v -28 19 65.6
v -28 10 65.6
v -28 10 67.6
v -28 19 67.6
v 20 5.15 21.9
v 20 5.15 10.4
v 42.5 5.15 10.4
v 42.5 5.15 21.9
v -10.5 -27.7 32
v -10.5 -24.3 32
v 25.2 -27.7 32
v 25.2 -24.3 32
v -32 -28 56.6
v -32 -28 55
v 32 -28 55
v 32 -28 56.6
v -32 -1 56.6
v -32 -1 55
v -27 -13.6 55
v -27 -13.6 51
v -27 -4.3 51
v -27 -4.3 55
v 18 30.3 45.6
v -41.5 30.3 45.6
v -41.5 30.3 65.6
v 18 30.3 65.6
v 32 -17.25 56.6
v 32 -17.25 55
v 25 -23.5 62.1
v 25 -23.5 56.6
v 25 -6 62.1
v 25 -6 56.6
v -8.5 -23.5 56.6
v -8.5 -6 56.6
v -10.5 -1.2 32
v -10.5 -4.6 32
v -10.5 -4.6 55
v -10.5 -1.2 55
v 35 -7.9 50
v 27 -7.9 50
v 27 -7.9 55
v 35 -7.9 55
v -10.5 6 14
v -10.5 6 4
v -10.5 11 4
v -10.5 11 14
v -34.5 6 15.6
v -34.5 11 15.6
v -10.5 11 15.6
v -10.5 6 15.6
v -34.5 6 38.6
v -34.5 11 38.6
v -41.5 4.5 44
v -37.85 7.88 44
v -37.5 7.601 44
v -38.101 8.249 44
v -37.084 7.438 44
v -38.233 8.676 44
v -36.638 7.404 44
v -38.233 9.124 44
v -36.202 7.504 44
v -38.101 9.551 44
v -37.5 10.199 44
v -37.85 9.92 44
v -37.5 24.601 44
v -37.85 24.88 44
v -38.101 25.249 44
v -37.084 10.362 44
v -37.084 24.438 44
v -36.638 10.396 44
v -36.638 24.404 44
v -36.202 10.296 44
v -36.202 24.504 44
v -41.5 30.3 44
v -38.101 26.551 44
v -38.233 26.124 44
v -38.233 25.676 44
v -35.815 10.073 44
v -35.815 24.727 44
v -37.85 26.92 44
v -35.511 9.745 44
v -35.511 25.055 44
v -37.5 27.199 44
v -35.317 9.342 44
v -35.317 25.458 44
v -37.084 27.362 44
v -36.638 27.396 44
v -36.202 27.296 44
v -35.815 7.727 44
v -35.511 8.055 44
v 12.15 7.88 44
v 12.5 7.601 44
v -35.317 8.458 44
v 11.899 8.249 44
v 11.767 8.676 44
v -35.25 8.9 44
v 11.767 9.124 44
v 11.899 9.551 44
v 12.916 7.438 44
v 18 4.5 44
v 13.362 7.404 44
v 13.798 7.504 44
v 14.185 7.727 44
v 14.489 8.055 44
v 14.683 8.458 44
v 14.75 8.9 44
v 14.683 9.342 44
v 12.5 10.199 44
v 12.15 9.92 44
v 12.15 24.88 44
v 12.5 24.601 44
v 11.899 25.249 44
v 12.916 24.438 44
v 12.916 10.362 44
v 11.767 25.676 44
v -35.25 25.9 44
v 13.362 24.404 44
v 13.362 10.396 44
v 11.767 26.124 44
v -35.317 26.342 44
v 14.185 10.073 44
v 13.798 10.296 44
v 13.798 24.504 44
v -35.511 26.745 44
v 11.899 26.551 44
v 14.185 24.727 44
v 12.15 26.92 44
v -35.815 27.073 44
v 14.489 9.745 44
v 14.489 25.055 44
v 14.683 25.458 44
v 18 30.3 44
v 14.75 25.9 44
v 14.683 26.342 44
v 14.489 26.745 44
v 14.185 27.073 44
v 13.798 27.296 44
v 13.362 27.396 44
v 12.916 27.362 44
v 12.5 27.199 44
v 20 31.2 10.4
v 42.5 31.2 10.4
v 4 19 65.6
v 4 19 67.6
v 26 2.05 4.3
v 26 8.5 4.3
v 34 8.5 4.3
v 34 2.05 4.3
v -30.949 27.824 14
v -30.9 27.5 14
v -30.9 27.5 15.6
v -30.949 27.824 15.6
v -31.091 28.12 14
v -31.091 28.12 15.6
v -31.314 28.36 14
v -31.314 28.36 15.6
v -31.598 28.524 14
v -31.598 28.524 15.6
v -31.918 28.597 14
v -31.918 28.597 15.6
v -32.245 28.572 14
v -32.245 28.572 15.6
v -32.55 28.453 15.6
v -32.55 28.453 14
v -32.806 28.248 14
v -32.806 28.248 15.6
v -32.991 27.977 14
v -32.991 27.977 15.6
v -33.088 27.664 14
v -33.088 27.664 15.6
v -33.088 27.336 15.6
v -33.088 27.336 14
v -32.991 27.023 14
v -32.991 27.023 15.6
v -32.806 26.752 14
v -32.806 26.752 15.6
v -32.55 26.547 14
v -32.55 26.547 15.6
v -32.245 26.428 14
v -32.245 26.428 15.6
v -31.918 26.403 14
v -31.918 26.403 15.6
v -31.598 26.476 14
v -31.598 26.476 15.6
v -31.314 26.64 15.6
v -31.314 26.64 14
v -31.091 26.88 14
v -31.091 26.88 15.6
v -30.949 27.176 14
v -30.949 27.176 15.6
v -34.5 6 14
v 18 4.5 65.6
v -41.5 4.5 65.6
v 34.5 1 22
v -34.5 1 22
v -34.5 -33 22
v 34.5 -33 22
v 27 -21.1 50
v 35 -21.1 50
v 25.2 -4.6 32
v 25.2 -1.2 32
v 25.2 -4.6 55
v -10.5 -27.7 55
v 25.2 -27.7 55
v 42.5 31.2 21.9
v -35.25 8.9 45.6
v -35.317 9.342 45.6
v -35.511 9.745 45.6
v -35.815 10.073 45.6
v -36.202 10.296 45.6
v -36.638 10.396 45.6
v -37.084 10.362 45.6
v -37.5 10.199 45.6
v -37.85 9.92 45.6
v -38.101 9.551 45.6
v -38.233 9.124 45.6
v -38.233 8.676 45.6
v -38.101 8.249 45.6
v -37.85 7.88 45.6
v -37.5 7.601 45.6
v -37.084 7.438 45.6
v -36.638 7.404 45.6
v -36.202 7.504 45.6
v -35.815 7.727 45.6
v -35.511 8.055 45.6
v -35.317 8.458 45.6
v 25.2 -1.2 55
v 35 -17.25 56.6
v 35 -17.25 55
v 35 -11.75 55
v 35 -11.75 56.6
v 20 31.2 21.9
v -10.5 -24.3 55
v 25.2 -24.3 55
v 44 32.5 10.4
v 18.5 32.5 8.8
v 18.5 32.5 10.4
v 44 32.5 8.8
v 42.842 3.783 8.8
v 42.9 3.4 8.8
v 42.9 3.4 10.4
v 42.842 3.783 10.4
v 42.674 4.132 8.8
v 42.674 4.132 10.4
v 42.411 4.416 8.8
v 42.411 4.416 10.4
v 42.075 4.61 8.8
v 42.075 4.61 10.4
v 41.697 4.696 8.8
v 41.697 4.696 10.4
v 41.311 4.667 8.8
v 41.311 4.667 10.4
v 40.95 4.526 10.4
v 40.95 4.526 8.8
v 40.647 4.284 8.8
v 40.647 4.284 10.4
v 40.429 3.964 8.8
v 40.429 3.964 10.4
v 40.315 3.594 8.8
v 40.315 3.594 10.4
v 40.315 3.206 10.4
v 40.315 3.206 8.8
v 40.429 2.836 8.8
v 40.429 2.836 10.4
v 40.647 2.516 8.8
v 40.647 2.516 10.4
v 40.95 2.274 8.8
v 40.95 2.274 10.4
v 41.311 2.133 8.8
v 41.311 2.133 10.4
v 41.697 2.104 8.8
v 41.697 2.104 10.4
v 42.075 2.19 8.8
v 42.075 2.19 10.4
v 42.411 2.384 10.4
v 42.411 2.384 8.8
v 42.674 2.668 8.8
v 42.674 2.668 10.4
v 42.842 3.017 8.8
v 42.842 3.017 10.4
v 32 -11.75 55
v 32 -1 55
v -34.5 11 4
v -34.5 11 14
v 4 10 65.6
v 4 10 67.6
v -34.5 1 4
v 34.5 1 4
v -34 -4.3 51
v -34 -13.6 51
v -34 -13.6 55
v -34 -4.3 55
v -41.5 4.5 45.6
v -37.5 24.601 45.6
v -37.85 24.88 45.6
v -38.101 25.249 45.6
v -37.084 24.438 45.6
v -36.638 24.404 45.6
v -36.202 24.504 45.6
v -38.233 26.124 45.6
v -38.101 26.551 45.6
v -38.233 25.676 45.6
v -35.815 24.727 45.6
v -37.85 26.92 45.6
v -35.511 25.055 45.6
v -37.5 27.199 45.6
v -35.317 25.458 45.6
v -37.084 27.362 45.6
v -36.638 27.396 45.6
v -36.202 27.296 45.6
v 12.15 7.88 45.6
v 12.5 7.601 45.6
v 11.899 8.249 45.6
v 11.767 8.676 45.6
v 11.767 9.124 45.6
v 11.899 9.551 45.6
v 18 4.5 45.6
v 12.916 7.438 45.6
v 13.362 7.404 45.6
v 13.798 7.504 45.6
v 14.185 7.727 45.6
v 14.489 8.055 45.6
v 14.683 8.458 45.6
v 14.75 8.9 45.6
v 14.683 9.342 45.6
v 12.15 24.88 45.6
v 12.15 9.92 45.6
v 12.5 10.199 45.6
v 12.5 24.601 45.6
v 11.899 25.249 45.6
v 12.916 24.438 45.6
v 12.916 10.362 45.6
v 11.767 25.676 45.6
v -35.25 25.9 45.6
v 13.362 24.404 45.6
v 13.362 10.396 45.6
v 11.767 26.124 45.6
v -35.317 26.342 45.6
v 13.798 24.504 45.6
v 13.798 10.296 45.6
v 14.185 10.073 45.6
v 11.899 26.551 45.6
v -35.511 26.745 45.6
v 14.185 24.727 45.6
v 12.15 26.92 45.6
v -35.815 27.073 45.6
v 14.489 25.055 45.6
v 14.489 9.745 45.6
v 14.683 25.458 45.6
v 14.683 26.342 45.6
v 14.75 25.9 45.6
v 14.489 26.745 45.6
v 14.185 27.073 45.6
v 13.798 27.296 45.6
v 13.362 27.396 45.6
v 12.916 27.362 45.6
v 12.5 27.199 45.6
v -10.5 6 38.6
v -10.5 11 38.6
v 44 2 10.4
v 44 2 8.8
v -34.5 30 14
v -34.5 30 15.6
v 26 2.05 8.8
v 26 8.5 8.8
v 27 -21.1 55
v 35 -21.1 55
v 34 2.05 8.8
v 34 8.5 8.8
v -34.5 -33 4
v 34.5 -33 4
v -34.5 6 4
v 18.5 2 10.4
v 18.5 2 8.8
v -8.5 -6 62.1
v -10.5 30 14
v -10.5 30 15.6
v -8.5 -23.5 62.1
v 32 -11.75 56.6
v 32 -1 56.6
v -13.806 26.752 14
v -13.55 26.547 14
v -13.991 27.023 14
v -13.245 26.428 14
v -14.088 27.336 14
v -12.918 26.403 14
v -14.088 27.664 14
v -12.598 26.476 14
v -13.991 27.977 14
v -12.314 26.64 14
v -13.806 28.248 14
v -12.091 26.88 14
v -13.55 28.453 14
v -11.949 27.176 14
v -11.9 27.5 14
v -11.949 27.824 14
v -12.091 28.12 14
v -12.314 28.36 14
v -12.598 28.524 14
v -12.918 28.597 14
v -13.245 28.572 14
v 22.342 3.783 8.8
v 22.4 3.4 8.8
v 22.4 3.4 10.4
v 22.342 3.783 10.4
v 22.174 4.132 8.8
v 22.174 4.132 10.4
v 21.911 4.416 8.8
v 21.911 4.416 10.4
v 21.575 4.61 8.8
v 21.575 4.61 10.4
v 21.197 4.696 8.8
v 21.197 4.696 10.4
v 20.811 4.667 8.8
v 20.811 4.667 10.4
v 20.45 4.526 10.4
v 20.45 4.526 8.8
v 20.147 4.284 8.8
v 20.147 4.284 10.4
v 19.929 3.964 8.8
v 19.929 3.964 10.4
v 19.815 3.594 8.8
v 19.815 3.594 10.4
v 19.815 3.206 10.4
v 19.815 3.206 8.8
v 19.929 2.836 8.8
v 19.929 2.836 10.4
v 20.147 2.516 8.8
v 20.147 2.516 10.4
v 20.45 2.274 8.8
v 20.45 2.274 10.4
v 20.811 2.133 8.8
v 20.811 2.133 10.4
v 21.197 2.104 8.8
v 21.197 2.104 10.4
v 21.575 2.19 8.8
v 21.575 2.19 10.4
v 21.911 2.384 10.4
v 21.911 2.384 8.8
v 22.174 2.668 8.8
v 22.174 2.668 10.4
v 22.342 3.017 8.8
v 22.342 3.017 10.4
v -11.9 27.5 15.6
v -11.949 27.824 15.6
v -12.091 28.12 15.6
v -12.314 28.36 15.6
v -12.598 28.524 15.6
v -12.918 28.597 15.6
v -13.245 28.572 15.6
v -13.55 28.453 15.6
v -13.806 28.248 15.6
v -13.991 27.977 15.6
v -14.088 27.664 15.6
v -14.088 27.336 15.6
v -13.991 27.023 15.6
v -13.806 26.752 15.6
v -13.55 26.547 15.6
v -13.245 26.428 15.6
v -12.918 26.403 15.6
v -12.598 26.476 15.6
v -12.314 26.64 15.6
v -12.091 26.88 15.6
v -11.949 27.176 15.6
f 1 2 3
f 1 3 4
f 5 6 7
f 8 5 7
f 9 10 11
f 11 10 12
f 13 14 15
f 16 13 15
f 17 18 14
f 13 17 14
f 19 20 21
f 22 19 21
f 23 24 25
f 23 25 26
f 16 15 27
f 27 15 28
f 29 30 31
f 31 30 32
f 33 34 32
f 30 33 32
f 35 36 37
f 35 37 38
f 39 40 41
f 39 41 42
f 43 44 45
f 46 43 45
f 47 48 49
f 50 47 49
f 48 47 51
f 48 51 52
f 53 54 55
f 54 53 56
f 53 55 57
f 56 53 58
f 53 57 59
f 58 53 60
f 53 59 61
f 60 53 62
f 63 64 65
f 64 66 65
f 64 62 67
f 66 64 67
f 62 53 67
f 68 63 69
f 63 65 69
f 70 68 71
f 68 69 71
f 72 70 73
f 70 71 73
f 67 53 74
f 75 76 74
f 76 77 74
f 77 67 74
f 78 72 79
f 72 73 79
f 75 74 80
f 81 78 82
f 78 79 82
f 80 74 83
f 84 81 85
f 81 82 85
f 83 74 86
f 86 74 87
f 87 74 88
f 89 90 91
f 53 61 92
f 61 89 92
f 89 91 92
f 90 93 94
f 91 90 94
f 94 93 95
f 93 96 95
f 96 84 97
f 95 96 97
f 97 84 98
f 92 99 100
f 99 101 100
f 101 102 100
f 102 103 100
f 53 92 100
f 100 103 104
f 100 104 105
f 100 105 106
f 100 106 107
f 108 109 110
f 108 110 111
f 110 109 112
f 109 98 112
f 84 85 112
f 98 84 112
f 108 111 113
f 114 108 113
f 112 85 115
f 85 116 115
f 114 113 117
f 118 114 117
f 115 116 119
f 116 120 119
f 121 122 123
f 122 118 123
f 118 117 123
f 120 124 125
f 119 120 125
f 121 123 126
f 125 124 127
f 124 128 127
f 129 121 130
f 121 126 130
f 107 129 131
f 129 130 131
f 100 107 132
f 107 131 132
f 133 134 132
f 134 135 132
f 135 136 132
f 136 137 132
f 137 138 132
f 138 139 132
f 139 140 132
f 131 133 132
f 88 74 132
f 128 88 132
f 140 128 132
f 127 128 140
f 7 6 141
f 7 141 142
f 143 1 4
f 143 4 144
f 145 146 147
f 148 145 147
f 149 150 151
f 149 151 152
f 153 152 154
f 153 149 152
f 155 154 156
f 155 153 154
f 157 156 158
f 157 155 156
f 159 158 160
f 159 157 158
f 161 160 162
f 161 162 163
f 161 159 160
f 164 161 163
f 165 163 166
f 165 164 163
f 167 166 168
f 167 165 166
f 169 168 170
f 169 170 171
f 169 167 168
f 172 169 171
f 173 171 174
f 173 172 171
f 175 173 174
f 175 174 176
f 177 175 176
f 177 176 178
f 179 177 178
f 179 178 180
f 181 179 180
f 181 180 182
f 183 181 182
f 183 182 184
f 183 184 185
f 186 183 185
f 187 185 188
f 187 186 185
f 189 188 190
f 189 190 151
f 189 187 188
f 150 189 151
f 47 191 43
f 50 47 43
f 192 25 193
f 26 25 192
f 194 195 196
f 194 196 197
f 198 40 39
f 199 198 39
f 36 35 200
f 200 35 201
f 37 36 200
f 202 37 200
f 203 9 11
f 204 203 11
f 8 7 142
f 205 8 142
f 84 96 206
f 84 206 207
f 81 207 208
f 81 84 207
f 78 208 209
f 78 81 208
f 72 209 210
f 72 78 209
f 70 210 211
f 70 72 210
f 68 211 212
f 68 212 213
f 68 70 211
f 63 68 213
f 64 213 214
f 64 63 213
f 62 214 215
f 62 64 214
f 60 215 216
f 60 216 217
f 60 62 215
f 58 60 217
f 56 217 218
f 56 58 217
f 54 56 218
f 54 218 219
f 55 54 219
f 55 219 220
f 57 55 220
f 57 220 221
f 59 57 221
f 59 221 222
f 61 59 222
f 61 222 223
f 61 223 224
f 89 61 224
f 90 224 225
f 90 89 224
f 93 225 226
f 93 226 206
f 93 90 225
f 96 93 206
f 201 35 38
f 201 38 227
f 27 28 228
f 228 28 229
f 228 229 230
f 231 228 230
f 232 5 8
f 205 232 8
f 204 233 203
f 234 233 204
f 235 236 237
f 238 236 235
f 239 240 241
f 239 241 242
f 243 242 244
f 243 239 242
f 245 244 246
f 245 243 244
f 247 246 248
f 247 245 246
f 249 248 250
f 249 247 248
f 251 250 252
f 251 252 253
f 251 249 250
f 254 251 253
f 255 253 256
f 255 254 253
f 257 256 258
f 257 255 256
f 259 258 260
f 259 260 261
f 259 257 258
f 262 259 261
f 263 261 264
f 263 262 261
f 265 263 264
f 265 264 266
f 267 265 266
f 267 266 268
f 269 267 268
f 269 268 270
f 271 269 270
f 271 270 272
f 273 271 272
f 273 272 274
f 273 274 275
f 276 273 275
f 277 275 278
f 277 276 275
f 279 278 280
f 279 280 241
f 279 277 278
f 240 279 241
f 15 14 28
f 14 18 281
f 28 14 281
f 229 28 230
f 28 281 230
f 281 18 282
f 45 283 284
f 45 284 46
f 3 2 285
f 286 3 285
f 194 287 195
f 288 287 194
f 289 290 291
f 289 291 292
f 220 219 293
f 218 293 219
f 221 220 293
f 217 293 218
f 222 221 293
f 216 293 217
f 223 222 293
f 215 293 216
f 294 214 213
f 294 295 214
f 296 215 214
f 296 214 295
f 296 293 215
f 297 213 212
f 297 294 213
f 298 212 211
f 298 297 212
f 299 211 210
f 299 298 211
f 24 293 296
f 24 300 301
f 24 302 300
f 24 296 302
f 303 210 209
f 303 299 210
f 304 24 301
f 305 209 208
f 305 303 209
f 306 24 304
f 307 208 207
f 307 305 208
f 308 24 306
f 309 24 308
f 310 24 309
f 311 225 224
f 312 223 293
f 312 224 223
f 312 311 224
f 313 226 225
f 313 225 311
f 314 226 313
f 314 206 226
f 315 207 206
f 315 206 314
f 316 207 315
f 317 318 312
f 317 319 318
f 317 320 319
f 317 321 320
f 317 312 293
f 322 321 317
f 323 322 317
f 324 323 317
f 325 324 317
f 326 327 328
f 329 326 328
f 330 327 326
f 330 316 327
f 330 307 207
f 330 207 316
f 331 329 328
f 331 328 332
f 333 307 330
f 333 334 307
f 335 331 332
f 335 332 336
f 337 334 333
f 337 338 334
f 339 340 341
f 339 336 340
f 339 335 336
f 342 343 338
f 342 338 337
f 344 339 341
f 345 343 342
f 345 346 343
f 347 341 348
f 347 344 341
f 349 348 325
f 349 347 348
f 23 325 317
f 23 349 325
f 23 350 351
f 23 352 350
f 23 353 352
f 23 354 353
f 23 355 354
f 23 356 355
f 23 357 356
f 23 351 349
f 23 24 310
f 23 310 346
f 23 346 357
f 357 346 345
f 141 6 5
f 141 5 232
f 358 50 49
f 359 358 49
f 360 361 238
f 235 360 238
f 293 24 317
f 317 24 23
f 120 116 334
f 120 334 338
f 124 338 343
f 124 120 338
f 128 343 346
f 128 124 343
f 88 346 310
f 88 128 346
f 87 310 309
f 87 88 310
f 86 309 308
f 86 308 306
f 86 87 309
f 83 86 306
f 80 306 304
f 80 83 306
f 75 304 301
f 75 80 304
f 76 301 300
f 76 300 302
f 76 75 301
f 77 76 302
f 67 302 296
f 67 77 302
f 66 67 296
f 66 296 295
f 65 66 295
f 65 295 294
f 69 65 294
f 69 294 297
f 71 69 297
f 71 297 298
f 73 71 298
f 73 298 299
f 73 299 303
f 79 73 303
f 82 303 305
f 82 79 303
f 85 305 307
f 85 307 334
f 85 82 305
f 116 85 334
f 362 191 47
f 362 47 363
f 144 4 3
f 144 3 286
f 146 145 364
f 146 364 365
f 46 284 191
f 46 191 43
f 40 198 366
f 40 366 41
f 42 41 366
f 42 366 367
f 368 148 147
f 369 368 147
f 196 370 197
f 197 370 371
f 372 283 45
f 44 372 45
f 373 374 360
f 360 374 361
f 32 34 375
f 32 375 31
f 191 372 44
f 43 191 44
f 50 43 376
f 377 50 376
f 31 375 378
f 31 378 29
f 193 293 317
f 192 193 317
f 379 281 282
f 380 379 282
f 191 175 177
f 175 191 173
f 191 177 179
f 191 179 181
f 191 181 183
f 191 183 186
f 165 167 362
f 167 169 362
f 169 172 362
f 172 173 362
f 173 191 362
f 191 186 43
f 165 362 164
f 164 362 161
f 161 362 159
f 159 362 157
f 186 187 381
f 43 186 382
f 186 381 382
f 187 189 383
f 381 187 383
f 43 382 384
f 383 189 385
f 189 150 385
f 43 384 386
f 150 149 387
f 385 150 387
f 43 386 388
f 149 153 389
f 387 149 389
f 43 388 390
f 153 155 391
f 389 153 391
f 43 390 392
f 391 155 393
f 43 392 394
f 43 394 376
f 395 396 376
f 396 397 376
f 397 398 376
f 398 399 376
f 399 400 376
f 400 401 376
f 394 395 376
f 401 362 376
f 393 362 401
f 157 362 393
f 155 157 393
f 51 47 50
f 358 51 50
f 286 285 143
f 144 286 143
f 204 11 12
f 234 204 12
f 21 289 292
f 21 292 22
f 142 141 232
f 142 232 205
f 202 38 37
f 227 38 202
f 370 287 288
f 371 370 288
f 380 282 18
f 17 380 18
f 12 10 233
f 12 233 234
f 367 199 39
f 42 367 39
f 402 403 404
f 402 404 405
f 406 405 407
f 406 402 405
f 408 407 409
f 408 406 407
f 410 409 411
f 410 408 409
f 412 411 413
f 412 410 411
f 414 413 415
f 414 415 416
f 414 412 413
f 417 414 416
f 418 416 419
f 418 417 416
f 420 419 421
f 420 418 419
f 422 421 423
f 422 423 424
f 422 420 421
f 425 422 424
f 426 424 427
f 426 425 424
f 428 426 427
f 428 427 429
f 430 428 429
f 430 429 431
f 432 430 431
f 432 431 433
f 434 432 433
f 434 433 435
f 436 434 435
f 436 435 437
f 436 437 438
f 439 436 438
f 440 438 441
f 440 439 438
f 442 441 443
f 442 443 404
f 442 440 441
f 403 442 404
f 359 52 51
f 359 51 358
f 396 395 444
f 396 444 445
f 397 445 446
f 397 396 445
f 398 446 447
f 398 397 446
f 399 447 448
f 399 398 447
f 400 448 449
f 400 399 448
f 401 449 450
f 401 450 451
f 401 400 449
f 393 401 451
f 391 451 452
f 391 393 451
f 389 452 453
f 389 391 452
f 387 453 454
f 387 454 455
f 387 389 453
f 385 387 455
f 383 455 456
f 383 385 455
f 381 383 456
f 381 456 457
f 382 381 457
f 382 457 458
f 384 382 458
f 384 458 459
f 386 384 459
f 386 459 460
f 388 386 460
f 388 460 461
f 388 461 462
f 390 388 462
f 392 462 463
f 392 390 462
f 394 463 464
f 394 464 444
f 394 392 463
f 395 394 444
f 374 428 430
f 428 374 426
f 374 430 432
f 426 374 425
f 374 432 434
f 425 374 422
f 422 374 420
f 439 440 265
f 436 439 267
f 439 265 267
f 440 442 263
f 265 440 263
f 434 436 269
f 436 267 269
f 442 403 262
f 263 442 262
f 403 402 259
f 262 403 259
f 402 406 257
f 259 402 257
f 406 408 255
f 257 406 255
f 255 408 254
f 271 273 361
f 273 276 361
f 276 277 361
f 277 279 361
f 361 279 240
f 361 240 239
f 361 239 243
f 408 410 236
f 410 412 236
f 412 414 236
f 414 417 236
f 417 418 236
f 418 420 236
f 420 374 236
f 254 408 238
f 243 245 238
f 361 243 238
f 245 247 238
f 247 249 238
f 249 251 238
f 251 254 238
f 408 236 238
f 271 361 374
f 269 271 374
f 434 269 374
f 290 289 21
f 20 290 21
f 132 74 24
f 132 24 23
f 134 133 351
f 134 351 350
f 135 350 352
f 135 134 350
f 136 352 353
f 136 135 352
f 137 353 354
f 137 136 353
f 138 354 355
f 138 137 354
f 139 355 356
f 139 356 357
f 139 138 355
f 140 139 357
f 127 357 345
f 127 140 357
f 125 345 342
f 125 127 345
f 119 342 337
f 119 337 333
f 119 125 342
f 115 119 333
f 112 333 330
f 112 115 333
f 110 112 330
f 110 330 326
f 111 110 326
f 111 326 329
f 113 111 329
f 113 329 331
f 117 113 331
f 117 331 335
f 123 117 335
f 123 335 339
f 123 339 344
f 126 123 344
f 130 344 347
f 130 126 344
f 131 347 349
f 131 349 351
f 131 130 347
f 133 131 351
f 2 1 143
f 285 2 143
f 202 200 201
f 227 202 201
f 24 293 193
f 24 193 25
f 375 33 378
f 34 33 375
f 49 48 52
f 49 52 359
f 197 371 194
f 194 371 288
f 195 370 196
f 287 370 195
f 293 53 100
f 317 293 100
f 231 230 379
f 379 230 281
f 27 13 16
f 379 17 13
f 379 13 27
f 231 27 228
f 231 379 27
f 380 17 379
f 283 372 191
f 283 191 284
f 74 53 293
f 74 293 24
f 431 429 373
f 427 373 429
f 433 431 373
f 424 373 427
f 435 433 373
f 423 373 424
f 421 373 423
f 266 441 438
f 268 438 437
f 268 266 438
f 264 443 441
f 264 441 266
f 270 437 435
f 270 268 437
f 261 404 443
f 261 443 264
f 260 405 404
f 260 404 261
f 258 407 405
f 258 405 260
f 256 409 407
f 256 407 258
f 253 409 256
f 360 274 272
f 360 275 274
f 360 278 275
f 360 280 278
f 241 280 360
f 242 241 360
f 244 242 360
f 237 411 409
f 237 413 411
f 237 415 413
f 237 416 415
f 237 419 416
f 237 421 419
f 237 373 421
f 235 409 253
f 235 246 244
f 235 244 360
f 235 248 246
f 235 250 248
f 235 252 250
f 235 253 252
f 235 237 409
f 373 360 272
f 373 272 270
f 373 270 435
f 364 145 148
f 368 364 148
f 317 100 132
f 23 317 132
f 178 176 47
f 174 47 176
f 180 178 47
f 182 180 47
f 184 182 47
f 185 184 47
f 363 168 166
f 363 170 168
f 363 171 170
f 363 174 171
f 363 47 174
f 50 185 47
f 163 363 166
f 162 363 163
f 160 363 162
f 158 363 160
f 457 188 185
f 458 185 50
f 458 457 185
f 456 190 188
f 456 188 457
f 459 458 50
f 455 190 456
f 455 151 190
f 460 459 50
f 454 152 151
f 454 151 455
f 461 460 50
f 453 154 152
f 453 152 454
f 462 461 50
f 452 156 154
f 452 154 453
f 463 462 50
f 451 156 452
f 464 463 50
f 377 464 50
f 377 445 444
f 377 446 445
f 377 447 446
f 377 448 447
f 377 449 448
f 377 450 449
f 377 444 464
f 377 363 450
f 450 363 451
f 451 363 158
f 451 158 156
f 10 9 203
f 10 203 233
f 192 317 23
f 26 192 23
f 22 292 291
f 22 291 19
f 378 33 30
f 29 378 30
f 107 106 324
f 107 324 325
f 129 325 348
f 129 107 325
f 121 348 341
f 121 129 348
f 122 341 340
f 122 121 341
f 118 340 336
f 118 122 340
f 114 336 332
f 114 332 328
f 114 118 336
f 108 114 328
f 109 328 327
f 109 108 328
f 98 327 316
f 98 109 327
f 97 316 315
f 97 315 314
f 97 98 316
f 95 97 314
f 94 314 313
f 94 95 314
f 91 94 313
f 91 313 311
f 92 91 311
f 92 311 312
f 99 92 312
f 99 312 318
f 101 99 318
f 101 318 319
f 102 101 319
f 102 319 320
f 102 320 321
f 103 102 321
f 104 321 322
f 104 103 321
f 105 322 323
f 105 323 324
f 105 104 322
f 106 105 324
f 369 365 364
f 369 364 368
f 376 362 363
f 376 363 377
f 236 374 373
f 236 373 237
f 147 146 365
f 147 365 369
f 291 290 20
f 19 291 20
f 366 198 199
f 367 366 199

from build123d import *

# Parameters (mm, degrees)
EXTRUDE_START           = 4
PROFILE_W               = 69
PROFILE_H               = 34
EXTRUDE_469_DEPTH       = 18
EXTRUDE_START_2         = 14
F_24_24_2_2_PROFILE_W   = 24
F_24_24_2_2_PROFILE_H   = 24
F_24_24_2_2_PROFILE_R   = 1.1
EXTRUDE_24_24_2_2_DEPTH = 1.6
F_5MM_10MM_START        = 4
F_5MM_10MM_PROFILE_W    = 24
F_5MM_10MM_PROFILE_H    = 5
F_5MM_10MM_DEPTH        = 10
F_5MM_START             = 15.6
F_5MM_PROFILE_W         = 24
F_5MM_PROFILE_H         = 5
F_5MM_DEPTH             = 23
GNSS_3MM_2_6_START      = 8.8
GNSS_3MM_2_6_PROFILE_W  = 25.5
GNSS_3MM_2_6_PROFILE_H  = 30.5
GNSS_3MM_2_6_PROFILE_R  = 1.3
GNSS_3MM_2_6_DEPTH      = 1.6
GNSS_11_5MM_START       = 10.4
GNSS_11_5MM_PROFILE_W   = 22.5
GNSS_11_5MM_PROFILE_H   = 26.05
GNSS_11_5MM_DEPTH       = 11.5
GNSS_START              = 4.3
GNSS_PROFILE_W          = 8
GNSS_PROFILE_H          = 6.45
GNSS_DEPTH              = 4.5
EXTRUDE_START_3         = 44
PROFILE_2_W             = 59.5
PROFILE_2_H             = 25.8
PROFILE_2_R             = 1.5
EXTRUDE_907_DEPTH       = 1.6
F_20MM_START            = 45.6
F_20MM_PROFILE_W        = 59.5
F_20MM_PROFILE_H        = 25.8
F_20MM_DEPTH            = 20
F_20MM_START_2          = 65.6
F_20MM_PROFILE_2_W      = 32
F_20MM_PROFILE_2_H      = 9
F_20MM_2_DEPTH          = 2
EORA_START              = 55
EORA_DEPTH              = 1.6
EORA_5_5MM_START        = 56.6
EORA_5_5MM_PROFILE_W    = 33.5
EORA_5_5MM_PROFILE_H    = 17.5
EORA_5_5MM_DEPTH        = 5.5
EORA_START_2            = 32
EORA_PROFILE_2_W        = 35.7
EORA_PROFILE_2_H        = 3.4
EORA_2_DEPTH            = 23
EORA_PROFILE_3_W        = 35.7
EORA_PROFILE_3_H        = 3.4
EORA_3_DEPTH            = 23
EORA_4MM_START          = 51
EORA_4MM_PROFILE_W      = 7
EORA_4MM_PROFILE_H      = 9.3
EORA_4MM_DEPTH          = 4
EORA_5MM_START          = 50
EORA_5MM_PROFILE_W      = 8
EORA_5MM_PROFILE_H      = 13.2
EORA_5MM_DEPTH          = 5


with BuildPart() as part:
    # profile → Extrude 469 (new body)
    with BuildSketch(Plane.XY.offset(EXTRUDE_START)):
        with Locations((0, -16)):
            Rectangle(PROFILE_W, PROFILE_H)
    extrude(amount=EXTRUDE_469_DEPTH)


with BuildPart() as body_2:
    # 传感器板 24×24，Ø2.2孔 profile → 传感器板 24×24，Ø2.2孔 (new body)
    with BuildSketch(Plane.XY.offset(EXTRUDE_START_2)):
        with Locations((-22.5, 18)):
            Rectangle(F_24_24_2_2_PROFILE_W, F_24_24_2_2_PROFILE_H)
        with Locations((-32, 27.5)):
            Circle(F_24_24_2_2_PROFILE_R, mode=Mode.SUBTRACT)
        with Locations((-13, 27.5)):
            Circle(F_24_24_2_2_PROFILE_R, mode=Mode.SUBTRACT)
    extrude(amount=EXTRUDE_24_24_2_2_DEPTH)


with BuildPart() as body_3:
    # 排针侧5mm，板下按10mm避空 profile → 排针侧5mm，板下按10mm避空 (new body)
    with BuildSketch(Plane.XY.offset(F_5MM_10MM_START)):
        with Locations((-22.5, 8.5)):
            Rectangle(F_5MM_10MM_PROFILE_W, F_5MM_10MM_PROFILE_H)
    extrude(amount=F_5MM_10MM_DEPTH)


with BuildPart() as body_4:
    # 排针侧5mm，板上线头和弯线预留 profile → 排针侧5mm，板上线头和弯线预留 (new body)
    with BuildSketch(Plane.XY.offset(F_5MM_START)):
        with Locations((-22.5, 8.5)):
            Rectangle(F_5MM_PROFILE_W, F_5MM_PROFILE_H)
    extrude(amount=F_5MM_DEPTH)


with BuildPart() as body_5:
    # GNSS板，3mm单边Ø2.6安装区 profile → GNSS板，3mm单边Ø2.6安装区 (new body)
    with BuildSketch(Plane.XY.offset(GNSS_3MM_2_6_START)):
        with Locations((31.25, 17.25)):
            Rectangle(GNSS_3MM_2_6_PROFILE_W, GNSS_3MM_2_6_PROFILE_H)
        with Locations((21.1, 3.4)):
            Circle(GNSS_3MM_2_6_PROFILE_R, mode=Mode.SUBTRACT)
        with Locations((41.6, 3.4)):
            Circle(GNSS_3MM_2_6_PROFILE_R, mode=Mode.SUBTRACT)
    extrude(amount=GNSS_3MM_2_6_DEPTH)


with BuildPart() as body_6:
    # GNSS陶瓷天线面朝上，保留11.5mm profile → GNSS陶瓷天线面朝上，保留11.5mm (new body)
    with BuildSketch(Plane.XY.offset(GNSS_11_5MM_START)):
        with Locations((31.25, 18.175)):
            Rectangle(GNSS_11_5MM_PROFILE_W, GNSS_11_5MM_PROFILE_H)
    extrude(amount=GNSS_11_5MM_DEPTH)


with BuildPart() as body_7:
    # GNSS背面插头预留 profile → GNSS背面插头预留 (new body)
    with BuildSketch(Plane.XY.offset(GNSS_START)):
        with Locations((30, 5.275)):
            Rectangle(GNSS_PROFILE_W, GNSS_PROFILE_H)
    extrude(amount=GNSS_DEPTH)


with BuildPart() as body_8:
    # profile 2 → Extrude 907 (new body)
    with BuildSketch(Plane.XY.offset(EXTRUDE_START_3)):
        with Locations((-11.75, 17.4)):
            Rectangle(PROFILE_2_W, PROFILE_2_H)
        with Locations((-36.75, 8.9)):
            Circle(PROFILE_2_R, mode=Mode.SUBTRACT)
        with Locations((13.25, 8.9)):
            Circle(PROFILE_2_R, mode=Mode.SUBTRACT)
        with Locations((-36.75, 25.9)):
            Circle(PROFILE_2_R, mode=Mode.SUBTRACT)
        with Locations((13.25, 25.9)):
            Circle(PROFILE_2_R, mode=Mode.SUBTRACT)
    extrude(amount=EXTRUDE_907_DEPTH)


with BuildPart() as body_9:
    # 20mm_ profile → 20mm (new body)
    with BuildSketch(Plane.XY.offset(F_20MM_START)):
        with Locations((-11.75, 17.4)):
            Rectangle(F_20MM_PROFILE_W, F_20MM_PROFILE_H)
    extrude(amount=F_20MM_DEPTH)


with BuildPart() as body_10:
    # 20mm_ profile 2 → 20mm 2 (new body)
    with BuildSketch(Plane.XY.offset(F_20MM_START_2)):
        with Locations((-12, 14.5)):
            Rectangle(F_20MM_PROFILE_2_W, F_20MM_PROFILE_2_H)
    extrude(amount=F_20MM_2_DEPTH)


with BuildPart() as body_11:
    # EoRa_ profile → EoRa (new body)
    with BuildSketch(Plane.XY.offset(EORA_START)):
        Polygon((-32, -28), (32, -28), (32, -17.25), (35, -17.25), (35, -11.75), (32, -11.75), (32, -1), (-32, -1), align=None)
    extrude(amount=EORA_DEPTH)


with BuildPart() as body_12:
    # EoRa屏幕5.5mm profile → EoRa屏幕5.5mm (new body)
    with BuildSketch(Plane.XY.offset(EORA_5_5MM_START)):
        with Locations((8.25, -14.75)):
            Rectangle(EORA_5_5MM_PROFILE_W, EORA_5_5MM_PROFILE_H)
    extrude(amount=EORA_5_5MM_DEPTH)


with BuildPart() as body_13:
    # EoRa_ profile 2 → EoRa 2 (new body)
    with BuildSketch(Plane.XY.offset(EORA_START_2)):
        with Locations((7.35, -26)):
            Rectangle(EORA_PROFILE_2_W, EORA_PROFILE_2_H)
    extrude(amount=EORA_2_DEPTH)


with BuildPart() as body_14:
    # EoRa_ profile 3 → EoRa 3 (new body)
    with BuildSketch(Plane.XY.offset(EORA_START_2)):
        with Locations((7.35, -2.9)):
            Rectangle(EORA_PROFILE_3_W, EORA_PROFILE_3_H)
    extrude(amount=EORA_3_DEPTH)


with BuildPart() as body_15:
    # EoRa接口端背面4mm避空 profile → EoRa接口端背面4mm避空 (new body)
    with BuildSketch(Plane.XY.offset(EORA_4MM_START)):
        with Locations((-30.5, -8.95)):
            Rectangle(EORA_4MM_PROFILE_W, EORA_4MM_PROFILE_H)
    extrude(amount=EORA_4MM_DEPTH)


with BuildPart() as body_16:
    # EoRa另一端背面5mm避空 profile → EoRa另一端背面5mm避空 (new body)
    with BuildSketch(Plane.XY.offset(EORA_5MM_START)):
        with Locations((31, -14.5)):
            Rectangle(EORA_5MM_PROFILE_W, EORA_5MM_PROFILE_H)
    extrude(amount=EORA_5MM_DEPTH)


solid = Compound([part.part, body_2.part, body_3.part, body_4.part, body_5.part, body_6.part, body_7.part, body_8.part, body_9.part, body_10.part, body_11.part, body_12.part, body_13.part, body_14.part, body_15.part, body_16.part])
